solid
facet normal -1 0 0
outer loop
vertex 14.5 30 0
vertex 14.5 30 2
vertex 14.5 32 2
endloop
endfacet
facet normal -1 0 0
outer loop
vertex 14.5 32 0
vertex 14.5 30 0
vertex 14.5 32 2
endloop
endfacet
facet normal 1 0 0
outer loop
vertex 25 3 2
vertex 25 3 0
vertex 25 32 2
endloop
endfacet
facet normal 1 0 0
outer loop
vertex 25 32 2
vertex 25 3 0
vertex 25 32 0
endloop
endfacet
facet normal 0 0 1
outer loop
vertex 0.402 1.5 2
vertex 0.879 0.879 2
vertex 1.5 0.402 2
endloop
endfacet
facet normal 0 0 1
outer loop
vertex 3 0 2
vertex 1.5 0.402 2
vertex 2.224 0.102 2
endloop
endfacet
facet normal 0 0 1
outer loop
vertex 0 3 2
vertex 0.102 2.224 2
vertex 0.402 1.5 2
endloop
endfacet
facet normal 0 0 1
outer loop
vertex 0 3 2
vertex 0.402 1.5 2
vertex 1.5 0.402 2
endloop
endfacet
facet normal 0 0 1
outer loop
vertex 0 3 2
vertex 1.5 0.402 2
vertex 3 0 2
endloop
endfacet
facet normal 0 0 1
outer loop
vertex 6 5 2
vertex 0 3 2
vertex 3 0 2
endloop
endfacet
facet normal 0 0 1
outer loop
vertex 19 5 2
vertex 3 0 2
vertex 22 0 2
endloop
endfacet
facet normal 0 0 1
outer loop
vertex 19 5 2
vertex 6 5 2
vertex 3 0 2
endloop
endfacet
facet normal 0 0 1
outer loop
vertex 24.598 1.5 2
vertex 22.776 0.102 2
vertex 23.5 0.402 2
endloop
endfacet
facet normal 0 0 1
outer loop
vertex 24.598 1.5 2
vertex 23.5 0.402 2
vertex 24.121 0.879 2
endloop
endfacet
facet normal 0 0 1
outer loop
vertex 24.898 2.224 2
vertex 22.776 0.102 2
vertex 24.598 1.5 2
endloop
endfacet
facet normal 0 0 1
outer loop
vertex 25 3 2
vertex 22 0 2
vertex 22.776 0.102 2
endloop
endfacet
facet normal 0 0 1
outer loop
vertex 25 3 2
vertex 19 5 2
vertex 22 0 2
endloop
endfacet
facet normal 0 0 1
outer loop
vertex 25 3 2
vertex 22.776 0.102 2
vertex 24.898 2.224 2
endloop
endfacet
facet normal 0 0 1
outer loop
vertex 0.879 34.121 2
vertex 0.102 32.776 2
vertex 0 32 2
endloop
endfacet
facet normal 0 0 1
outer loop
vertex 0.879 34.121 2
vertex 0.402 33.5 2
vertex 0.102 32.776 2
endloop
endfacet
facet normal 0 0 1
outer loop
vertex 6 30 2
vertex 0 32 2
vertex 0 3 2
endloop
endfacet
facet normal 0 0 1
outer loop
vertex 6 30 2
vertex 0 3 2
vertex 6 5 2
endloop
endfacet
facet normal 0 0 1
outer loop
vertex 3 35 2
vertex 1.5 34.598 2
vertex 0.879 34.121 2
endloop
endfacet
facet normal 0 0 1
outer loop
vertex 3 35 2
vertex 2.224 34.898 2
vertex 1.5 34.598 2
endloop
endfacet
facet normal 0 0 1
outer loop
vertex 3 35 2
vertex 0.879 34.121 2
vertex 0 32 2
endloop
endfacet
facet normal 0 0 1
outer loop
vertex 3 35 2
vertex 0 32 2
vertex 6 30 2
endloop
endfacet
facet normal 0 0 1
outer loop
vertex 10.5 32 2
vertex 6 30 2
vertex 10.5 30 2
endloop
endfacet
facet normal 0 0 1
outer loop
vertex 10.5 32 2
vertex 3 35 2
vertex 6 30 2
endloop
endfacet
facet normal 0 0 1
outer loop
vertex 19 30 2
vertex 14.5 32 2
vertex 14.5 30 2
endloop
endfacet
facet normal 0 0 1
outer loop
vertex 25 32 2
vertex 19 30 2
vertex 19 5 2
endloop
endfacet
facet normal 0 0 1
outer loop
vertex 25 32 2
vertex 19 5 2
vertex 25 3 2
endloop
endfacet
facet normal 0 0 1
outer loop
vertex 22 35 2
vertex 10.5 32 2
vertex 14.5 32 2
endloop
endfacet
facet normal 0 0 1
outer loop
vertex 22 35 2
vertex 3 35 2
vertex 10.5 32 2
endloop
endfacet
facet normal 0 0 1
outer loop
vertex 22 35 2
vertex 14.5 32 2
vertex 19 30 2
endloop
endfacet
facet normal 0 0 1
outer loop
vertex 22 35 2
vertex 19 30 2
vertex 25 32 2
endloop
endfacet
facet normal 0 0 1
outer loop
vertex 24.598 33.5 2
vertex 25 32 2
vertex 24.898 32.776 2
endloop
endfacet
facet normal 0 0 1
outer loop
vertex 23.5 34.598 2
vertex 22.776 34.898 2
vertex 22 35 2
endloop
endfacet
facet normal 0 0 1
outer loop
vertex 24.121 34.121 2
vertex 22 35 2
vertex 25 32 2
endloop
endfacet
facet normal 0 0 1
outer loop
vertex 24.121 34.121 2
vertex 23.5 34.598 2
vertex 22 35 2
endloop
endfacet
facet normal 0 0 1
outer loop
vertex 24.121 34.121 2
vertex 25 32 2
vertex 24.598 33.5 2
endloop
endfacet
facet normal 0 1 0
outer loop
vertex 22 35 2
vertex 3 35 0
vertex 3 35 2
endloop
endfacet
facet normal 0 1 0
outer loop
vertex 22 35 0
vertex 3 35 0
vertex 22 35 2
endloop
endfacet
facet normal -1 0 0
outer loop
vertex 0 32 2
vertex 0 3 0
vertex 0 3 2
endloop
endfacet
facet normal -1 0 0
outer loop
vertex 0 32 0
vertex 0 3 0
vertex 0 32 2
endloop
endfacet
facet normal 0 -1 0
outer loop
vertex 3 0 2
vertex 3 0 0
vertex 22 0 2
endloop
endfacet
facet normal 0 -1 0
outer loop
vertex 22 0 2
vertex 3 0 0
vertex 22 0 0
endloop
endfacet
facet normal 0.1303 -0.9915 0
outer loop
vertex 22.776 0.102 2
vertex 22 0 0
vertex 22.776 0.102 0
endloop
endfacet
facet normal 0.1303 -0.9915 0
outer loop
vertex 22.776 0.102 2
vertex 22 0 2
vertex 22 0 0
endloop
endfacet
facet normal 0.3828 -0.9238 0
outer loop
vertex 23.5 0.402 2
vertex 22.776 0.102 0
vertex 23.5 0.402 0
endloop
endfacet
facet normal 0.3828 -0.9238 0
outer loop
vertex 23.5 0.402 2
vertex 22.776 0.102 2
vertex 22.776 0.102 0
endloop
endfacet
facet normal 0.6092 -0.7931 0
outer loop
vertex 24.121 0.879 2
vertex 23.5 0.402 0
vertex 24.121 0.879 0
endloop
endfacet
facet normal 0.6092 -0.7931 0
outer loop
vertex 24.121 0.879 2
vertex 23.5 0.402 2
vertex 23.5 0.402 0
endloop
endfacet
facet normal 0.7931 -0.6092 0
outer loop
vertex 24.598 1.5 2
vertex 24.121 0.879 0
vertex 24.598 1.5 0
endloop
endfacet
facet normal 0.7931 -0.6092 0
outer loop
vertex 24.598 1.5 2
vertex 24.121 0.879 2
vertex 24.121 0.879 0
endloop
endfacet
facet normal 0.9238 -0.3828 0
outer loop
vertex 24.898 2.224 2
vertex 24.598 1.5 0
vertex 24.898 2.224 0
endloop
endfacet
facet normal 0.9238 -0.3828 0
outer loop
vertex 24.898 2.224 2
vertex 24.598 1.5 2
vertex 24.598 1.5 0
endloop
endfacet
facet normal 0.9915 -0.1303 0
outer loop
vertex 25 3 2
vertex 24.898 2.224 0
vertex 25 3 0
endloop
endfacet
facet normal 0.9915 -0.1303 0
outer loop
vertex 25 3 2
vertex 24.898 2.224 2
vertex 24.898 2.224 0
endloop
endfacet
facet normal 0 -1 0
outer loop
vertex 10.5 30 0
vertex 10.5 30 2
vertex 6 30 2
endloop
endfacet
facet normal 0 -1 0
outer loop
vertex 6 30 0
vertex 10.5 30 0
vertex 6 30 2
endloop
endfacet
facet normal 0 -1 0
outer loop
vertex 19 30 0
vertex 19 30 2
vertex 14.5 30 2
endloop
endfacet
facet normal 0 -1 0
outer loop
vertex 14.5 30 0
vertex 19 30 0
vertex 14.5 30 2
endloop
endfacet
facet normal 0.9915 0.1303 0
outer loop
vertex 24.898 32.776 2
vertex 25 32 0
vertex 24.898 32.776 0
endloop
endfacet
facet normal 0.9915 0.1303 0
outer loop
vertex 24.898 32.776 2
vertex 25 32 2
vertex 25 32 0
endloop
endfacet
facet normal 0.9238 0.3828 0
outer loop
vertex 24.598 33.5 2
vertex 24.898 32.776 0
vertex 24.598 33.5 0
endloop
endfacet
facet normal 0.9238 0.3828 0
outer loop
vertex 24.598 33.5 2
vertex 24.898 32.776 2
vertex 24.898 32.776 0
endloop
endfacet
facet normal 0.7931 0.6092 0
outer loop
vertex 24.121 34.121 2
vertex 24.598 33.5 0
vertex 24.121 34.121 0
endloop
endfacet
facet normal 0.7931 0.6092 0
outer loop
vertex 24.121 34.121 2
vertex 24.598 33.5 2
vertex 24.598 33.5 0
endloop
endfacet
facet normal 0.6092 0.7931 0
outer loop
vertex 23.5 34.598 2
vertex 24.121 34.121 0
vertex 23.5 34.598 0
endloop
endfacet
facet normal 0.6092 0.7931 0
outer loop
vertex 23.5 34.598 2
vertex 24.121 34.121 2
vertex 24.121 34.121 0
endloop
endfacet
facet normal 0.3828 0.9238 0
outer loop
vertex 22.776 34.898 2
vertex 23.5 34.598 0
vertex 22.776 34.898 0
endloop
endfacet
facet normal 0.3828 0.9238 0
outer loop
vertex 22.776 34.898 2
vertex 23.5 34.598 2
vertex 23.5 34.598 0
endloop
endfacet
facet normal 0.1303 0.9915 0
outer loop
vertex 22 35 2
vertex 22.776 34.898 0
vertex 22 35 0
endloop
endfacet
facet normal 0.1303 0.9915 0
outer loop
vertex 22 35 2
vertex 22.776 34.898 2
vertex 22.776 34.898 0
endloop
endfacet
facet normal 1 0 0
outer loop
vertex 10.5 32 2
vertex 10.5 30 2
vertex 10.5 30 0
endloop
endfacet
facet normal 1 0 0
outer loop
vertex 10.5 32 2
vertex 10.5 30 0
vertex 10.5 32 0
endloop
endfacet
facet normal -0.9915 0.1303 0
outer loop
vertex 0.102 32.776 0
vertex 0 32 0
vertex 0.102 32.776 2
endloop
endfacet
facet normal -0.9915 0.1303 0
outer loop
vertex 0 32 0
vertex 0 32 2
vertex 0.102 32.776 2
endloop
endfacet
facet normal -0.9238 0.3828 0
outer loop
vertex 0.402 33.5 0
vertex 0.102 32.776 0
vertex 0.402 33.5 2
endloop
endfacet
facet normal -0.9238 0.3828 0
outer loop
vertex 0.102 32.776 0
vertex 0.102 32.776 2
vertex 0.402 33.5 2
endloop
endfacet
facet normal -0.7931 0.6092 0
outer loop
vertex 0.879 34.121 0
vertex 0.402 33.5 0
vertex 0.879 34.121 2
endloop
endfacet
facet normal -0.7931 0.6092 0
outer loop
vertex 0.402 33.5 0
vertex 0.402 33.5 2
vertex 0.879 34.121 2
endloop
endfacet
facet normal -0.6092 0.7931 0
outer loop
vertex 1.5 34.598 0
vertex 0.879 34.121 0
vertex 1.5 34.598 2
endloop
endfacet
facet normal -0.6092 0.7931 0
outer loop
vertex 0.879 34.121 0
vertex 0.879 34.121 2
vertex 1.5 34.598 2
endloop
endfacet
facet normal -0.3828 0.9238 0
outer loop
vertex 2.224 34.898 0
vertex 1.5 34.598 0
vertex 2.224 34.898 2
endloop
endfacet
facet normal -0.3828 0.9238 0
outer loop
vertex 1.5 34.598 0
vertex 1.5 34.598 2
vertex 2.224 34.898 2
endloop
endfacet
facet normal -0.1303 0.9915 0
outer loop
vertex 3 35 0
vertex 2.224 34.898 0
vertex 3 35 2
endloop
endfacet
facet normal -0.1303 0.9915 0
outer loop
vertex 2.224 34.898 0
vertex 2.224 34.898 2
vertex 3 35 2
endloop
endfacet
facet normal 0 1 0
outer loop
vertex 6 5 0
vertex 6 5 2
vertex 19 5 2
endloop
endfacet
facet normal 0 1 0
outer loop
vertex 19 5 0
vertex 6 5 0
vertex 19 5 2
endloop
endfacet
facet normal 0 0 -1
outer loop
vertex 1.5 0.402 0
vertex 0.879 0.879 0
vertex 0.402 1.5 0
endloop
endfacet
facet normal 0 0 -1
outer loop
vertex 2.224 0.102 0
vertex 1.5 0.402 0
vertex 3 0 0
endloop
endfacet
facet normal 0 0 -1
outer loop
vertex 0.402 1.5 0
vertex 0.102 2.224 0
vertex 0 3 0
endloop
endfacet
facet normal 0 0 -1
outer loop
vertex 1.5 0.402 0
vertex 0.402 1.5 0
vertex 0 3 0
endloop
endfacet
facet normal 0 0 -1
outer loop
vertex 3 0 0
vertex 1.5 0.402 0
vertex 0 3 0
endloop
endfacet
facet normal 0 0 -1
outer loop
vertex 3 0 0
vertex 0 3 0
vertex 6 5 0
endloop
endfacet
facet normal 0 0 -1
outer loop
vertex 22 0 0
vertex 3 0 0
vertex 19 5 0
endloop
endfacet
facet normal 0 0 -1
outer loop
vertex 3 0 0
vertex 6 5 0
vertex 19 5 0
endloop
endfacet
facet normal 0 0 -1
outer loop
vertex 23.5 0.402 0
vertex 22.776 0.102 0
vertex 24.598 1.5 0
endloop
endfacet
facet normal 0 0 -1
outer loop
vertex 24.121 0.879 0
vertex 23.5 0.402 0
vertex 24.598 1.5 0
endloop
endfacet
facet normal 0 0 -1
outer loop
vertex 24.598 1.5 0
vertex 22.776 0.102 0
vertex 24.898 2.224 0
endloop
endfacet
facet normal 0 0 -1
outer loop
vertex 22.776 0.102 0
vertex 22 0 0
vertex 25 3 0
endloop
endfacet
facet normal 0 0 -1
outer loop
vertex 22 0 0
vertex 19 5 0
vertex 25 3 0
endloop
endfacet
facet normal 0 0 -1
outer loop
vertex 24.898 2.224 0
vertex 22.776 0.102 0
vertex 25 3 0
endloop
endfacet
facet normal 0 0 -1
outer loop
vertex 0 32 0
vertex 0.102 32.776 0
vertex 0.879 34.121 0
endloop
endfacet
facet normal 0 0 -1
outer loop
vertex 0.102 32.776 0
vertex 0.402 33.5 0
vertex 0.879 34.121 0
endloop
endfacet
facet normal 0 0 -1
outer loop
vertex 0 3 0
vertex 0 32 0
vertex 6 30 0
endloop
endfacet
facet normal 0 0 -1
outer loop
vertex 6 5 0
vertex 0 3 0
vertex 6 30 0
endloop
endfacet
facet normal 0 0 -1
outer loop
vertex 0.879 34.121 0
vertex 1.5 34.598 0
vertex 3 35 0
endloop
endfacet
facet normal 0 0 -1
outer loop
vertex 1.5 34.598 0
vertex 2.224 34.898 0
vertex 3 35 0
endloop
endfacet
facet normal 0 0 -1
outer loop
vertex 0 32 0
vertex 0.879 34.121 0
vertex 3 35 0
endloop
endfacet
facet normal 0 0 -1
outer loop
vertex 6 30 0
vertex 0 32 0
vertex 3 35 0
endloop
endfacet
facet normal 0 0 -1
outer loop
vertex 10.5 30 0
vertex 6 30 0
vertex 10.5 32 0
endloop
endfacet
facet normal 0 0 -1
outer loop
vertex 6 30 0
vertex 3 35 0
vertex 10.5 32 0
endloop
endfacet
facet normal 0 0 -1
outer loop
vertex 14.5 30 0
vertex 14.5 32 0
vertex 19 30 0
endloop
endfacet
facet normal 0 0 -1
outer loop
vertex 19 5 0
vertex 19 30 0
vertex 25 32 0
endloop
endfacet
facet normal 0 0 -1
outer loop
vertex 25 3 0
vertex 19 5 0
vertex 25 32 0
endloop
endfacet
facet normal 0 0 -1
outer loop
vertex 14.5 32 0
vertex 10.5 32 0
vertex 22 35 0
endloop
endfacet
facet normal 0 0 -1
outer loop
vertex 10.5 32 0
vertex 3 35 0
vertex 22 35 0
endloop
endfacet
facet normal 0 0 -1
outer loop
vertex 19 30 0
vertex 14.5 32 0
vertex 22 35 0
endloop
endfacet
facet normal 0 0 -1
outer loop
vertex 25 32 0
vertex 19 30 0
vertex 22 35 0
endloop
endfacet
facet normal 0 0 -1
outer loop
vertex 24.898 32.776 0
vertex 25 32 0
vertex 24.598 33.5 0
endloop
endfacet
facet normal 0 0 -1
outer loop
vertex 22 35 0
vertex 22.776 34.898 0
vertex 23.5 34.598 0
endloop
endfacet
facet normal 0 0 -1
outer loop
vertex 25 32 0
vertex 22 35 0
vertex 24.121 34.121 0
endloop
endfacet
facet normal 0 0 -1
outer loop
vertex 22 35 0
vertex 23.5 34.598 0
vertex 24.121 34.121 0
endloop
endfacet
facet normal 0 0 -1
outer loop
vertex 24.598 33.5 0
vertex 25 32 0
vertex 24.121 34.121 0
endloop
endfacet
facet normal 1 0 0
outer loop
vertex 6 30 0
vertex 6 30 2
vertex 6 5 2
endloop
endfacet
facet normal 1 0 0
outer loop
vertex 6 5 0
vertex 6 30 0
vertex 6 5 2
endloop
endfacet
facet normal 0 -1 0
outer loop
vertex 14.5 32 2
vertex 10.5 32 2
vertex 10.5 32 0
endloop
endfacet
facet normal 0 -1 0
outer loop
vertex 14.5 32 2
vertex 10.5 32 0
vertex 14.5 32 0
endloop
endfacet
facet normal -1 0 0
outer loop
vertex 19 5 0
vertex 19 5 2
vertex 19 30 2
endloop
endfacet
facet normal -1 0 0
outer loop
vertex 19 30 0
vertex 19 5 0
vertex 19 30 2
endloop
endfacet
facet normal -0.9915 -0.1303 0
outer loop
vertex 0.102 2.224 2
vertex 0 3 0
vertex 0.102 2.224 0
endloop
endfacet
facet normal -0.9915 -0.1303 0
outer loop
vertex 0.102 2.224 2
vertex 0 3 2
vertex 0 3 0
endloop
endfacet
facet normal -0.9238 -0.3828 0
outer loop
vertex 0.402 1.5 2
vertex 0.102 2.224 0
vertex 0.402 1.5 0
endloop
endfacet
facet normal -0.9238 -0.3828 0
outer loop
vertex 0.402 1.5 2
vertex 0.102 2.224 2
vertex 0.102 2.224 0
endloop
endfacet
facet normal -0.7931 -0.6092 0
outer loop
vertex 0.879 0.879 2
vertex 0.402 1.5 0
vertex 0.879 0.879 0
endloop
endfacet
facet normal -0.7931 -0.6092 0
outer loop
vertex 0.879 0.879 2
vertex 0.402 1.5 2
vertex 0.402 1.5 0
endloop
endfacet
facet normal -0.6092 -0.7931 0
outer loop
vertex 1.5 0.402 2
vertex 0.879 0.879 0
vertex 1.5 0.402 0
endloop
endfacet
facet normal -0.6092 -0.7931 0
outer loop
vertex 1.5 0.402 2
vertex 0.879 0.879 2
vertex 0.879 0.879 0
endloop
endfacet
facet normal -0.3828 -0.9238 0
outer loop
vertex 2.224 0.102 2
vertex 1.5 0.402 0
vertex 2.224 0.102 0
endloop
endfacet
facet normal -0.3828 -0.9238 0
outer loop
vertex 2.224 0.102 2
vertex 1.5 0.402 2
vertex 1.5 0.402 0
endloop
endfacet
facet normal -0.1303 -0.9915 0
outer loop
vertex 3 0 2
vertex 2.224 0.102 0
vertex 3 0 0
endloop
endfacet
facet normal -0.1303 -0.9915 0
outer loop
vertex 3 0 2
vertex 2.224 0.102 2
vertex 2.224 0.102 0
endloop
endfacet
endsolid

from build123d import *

# Parameters (mm, degrees)
F0_W     = 25
F0_H     = 35
F1_DEPTH = 2
F2_R     = 3
F3_W     = 4
F3_H     = 2
F4_DEPTH = 100


with BuildPart() as f1:
    # F0 (on Top) → F1 (new body)
    with BuildSketch(Plane.XY):
        with Locations((12.5, 17.5)):
            Rectangle(F0_W, F0_H)
    extrude(amount=F1_DEPTH)

    # F2
    f2_edges = [f1.edges().sort_by_distance(p)[0] for p in [
        (25, 35, 1),
        (0, 35, 1),
        (25, 0, 1),
        (0, 0, 1),
    ]]
    fillet(f2_edges, radius=F2_R)

    # F3 (on face) → F4 (cut)
    with BuildSketch(Plane.XY.offset(2)):
        Polygon((10.5, 30), (6, 30), (6, 5), (19, 5), (19, 30), (14.5, 30), (14.5, 28), (10.5, 28), align=None)
        with Locations((12.5, 31)):
            Rectangle(F3_W, F3_H)
        with Locations((12.5, 29)):
            Rectangle(F3_W, F3_H)
    extrude(amount=-F4_DEPTH, mode=Mode.SUBTRACT)


solid = f1.part
